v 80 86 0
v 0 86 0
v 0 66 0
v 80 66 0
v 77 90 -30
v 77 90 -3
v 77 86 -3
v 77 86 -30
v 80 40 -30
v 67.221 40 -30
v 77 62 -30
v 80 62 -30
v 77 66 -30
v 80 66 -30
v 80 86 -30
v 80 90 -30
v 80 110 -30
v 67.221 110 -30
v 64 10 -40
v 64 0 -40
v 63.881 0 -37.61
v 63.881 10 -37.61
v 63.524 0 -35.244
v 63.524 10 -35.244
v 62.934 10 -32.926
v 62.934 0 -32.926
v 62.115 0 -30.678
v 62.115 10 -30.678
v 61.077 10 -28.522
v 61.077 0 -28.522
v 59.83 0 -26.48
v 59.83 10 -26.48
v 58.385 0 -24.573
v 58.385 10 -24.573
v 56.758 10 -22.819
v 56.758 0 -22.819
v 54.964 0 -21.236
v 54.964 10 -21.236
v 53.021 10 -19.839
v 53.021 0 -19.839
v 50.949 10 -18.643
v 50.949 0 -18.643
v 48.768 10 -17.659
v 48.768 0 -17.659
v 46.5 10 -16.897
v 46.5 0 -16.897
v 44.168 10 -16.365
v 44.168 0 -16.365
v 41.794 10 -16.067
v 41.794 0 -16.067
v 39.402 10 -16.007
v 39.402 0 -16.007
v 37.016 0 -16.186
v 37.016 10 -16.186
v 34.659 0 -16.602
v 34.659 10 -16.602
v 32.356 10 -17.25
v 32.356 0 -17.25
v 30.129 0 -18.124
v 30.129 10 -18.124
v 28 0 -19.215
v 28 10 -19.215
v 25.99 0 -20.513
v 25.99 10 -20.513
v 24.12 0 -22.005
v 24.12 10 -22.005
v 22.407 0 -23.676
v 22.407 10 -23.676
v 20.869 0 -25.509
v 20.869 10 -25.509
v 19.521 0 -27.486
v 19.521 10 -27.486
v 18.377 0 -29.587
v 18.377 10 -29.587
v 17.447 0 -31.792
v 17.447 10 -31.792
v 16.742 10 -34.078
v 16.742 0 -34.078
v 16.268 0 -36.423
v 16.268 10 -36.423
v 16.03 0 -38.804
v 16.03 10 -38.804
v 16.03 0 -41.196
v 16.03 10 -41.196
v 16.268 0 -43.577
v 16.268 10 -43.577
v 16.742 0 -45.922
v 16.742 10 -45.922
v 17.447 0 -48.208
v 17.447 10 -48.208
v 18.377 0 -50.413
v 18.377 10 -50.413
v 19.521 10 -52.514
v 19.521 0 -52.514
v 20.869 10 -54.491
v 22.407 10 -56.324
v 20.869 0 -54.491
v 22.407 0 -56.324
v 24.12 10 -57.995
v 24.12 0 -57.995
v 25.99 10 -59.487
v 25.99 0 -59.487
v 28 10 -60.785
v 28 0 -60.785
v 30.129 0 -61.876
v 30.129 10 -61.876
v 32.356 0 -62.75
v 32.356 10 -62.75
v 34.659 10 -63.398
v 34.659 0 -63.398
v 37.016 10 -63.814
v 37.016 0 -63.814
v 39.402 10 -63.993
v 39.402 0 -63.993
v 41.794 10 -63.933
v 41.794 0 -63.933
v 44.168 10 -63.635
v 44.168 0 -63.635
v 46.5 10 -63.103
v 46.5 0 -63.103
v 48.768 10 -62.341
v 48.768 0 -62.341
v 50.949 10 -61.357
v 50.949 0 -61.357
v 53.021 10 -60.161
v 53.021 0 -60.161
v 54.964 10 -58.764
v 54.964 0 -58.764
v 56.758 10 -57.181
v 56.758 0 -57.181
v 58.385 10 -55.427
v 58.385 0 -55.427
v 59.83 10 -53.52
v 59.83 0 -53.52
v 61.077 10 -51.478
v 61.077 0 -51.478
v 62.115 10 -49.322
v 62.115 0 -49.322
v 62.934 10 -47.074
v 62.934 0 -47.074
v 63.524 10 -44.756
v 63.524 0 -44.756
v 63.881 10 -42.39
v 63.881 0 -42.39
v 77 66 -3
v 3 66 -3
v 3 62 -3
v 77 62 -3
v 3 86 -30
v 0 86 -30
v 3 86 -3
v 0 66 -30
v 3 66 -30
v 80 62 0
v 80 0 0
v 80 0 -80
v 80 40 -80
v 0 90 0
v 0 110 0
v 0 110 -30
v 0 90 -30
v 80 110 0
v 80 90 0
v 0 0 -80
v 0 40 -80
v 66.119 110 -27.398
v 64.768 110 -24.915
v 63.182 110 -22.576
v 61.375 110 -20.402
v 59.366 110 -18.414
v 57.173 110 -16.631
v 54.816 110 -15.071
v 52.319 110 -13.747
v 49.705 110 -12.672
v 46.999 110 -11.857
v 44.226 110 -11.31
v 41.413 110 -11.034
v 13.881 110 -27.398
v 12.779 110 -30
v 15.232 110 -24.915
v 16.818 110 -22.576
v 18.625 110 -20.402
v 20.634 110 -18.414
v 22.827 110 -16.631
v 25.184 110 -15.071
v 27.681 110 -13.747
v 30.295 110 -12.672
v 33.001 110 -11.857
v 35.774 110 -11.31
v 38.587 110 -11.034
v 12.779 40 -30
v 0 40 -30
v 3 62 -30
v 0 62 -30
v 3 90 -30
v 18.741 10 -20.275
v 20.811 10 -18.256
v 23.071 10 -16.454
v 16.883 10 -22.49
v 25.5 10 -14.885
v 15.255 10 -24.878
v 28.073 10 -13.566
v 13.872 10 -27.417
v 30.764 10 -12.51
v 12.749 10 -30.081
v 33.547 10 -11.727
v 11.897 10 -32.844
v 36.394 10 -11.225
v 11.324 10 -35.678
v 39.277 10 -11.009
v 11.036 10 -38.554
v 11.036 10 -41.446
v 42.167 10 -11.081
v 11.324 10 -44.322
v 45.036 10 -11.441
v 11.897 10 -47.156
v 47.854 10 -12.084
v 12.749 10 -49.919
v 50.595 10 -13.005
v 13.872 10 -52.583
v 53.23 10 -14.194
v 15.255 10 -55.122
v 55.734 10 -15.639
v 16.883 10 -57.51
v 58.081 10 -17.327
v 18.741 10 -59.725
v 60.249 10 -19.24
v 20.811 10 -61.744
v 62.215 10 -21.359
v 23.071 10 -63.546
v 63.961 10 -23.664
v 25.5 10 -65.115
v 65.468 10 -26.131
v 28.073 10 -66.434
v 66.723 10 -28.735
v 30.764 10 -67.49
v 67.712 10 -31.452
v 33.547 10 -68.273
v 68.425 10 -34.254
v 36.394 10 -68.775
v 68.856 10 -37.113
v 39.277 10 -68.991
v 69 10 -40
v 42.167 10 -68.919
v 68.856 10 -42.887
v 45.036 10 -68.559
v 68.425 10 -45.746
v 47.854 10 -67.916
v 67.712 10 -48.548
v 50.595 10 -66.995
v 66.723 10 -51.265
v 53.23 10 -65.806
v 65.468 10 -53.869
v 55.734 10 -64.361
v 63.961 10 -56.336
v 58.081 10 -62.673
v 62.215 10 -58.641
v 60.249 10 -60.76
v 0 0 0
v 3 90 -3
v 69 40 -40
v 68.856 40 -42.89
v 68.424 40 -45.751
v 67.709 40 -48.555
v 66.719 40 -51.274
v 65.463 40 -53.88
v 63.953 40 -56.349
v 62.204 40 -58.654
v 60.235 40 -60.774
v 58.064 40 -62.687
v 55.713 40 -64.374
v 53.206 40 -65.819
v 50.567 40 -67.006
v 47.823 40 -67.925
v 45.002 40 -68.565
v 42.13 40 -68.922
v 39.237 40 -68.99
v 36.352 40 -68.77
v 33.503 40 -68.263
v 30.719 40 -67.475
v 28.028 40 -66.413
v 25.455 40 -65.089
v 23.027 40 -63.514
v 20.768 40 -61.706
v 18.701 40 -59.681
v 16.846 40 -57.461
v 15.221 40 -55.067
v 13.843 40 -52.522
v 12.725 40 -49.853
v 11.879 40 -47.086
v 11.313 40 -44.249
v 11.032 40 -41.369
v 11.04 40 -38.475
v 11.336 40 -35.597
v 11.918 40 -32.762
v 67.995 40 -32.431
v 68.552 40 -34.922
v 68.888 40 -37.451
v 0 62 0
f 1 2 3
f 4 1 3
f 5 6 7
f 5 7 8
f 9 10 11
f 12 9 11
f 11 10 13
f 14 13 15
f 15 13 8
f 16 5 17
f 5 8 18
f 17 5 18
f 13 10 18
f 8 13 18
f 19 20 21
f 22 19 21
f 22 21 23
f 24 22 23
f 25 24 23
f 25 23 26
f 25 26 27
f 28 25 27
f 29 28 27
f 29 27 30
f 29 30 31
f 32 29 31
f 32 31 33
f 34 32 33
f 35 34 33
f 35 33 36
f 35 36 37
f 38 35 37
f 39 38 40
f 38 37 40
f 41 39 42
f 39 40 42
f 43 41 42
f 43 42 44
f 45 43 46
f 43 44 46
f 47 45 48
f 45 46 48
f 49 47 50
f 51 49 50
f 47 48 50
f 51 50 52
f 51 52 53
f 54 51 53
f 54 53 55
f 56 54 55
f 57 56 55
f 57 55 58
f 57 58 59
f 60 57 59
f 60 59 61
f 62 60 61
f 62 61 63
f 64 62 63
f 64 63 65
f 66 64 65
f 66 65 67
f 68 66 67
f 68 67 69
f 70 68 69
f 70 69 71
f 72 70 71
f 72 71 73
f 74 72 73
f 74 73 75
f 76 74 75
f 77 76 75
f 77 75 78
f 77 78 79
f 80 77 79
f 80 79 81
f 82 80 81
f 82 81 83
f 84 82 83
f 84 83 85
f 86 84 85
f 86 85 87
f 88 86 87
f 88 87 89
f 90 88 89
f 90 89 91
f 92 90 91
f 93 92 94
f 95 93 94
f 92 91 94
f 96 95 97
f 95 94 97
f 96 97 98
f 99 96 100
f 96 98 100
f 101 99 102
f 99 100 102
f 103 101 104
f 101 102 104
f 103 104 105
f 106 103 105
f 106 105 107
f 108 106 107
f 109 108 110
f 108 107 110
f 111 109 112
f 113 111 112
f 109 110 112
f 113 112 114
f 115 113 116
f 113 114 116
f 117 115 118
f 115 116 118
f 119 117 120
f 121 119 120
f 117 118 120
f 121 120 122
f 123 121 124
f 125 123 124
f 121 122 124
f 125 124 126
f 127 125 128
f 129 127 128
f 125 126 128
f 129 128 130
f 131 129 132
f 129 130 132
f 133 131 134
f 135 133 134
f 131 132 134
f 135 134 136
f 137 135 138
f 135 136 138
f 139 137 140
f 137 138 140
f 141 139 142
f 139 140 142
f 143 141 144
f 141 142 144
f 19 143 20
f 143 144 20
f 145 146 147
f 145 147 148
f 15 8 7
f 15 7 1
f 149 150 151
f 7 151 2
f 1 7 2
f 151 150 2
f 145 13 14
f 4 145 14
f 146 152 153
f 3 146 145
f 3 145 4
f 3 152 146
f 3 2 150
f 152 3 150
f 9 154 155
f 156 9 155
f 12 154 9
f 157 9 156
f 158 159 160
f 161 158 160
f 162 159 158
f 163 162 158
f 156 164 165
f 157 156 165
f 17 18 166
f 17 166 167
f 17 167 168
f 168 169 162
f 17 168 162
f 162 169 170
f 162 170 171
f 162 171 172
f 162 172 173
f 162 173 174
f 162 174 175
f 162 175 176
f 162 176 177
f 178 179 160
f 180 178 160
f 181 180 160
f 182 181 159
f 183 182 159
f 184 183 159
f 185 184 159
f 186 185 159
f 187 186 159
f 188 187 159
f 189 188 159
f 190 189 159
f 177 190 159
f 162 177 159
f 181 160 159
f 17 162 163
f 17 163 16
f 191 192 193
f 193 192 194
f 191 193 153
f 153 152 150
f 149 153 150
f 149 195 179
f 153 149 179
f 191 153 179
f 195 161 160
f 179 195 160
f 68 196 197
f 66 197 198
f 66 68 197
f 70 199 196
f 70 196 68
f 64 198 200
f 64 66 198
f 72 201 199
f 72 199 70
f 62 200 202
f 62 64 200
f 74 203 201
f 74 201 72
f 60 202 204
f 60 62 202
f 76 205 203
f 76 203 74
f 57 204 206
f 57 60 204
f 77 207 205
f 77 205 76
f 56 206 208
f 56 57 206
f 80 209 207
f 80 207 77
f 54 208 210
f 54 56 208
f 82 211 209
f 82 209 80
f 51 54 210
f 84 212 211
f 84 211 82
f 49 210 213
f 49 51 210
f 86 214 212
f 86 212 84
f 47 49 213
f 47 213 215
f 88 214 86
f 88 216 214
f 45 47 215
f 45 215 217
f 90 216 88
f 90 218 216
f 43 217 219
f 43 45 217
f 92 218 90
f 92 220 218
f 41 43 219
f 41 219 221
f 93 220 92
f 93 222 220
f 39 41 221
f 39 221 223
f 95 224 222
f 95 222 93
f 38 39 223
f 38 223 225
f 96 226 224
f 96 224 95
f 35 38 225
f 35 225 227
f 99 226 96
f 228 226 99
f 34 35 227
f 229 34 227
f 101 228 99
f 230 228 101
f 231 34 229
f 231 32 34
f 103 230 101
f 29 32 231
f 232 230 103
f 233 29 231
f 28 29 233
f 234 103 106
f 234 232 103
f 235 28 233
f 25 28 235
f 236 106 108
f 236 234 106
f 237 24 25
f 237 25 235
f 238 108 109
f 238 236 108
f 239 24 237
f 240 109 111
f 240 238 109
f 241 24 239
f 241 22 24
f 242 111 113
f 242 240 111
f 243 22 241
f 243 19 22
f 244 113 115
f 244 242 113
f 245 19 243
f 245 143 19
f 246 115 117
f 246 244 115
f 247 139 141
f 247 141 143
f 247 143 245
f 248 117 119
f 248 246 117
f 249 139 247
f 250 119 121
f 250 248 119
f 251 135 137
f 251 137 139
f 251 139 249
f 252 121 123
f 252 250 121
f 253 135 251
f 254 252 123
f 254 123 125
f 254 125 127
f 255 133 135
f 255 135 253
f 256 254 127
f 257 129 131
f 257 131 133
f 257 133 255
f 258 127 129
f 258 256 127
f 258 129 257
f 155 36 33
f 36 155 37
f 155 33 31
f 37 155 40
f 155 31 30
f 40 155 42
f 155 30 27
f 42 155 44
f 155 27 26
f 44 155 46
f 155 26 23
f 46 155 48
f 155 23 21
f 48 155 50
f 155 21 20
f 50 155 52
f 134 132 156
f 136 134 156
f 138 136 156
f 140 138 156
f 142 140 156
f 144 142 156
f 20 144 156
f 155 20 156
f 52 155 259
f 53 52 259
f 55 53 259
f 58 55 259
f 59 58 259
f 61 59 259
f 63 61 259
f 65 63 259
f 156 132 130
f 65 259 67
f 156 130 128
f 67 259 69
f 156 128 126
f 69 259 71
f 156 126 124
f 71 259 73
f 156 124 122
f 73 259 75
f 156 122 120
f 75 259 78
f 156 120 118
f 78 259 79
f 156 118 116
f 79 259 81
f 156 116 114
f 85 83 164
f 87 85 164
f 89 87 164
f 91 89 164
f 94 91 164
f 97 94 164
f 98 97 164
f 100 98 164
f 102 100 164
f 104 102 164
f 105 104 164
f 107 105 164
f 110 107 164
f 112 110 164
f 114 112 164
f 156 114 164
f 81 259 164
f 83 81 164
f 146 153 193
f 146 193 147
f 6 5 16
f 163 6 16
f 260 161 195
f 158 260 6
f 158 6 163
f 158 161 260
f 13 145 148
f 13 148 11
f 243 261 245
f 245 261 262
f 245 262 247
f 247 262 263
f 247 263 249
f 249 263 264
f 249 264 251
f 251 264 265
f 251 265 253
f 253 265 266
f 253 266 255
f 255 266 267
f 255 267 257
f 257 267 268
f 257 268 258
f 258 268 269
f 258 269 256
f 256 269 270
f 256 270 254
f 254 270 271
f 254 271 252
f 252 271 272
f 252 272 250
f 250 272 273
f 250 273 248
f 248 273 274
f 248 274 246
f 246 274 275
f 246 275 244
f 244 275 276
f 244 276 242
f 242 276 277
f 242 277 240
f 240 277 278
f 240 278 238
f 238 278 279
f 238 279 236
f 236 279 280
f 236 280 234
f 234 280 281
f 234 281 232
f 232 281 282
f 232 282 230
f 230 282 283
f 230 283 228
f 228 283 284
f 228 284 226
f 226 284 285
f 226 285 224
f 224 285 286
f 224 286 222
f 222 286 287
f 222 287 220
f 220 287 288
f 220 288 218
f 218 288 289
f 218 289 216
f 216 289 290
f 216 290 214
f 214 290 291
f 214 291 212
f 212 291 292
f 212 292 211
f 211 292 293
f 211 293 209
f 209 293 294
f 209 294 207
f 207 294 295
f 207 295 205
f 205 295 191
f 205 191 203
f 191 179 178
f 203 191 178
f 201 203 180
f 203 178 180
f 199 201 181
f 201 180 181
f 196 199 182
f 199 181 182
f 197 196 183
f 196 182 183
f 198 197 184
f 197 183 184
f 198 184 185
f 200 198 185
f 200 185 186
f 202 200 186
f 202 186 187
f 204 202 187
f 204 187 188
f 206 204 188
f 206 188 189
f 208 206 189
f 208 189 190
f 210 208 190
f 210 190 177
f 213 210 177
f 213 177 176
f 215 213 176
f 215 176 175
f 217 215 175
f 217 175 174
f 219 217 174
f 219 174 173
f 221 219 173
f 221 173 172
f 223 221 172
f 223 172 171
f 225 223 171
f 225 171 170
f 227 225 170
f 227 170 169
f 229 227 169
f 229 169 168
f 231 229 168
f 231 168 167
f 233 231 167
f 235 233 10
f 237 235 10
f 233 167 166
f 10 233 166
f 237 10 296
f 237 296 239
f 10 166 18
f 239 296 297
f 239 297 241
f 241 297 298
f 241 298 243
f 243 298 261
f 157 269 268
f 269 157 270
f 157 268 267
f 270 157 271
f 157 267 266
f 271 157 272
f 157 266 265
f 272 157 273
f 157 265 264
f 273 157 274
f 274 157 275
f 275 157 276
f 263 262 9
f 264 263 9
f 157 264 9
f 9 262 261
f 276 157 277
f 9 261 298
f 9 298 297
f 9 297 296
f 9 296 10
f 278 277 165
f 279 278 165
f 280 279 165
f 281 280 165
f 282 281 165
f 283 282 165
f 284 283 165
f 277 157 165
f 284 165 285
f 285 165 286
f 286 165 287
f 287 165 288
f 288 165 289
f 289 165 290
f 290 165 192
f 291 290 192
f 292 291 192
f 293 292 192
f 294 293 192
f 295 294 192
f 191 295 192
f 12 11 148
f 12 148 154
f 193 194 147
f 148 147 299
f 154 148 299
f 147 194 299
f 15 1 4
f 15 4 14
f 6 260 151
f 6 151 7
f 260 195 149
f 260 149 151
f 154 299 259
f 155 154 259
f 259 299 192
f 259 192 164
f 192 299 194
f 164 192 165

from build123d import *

# Parameters (mm, degrees)
BOSS_EXTRUDE2_DEPTH = 80
SKETCH5_R           = 29
CUT_EXTRUDE1_DEPTH  = 100
SKETCH6_R           = 24
CUT_EXTRUDE2_DEPTH  = 111
SKETCH7_W           = 30
SKETCH7_H           = 4
CUT_EXTRUDE3_DEPTH  = 3
SKETCH8_W           = 30
SKETCH8_H           = 4
CUT_EXTRUDE4_DEPTH  = 3
SKETCH9_W           = 74
SKETCH9_H           = 4
CUT_EXTRUDE5_DEPTH  = 3


with BuildPart() as part:
    # Sketch4 → Boss-Extrude2 (new body)
    with BuildSketch(Plane(origin=(0, 0, 0), x_dir=(0, 0, -1), z_dir=(1, 0, 0))):
        Polygon((0, 0), (80, 0), (80, 40), (30, 40), (30, 110), (0, 110), align=None)
    extrude(amount=BOSS_EXTRUDE2_DEPTH)

    # Sketch5 → Cut-Extrude1 (cut)
    with BuildSketch(Plane(origin=(0, 110, 0), x_dir=(1, 0, 0), z_dir=(0, 1, 0))):
        with Locations((40, 40)):
            Circle(SKETCH5_R)
    extrude(amount=-CUT_EXTRUDE1_DEPTH, mode=Mode.SUBTRACT)

    # Sketch6 → Cut-Extrude2 (cut, through all)
    with BuildSketch(Plane.XZ):
        with Locations((40, -40)):
            Circle(SKETCH6_R)
    extrude(amount=-CUT_EXTRUDE2_DEPTH, mode=Mode.SUBTRACT)

    # Sketch7 → Cut-Extrude3 (cut)
    with BuildSketch(Plane(origin=(80, 0, 0), x_dir=(0, 0, -1), z_dir=(1, 0, 0))):
        with Locations((15, 88)):
            Rectangle(SKETCH7_W, SKETCH7_H)
        with Locations((15, 64)):
            Rectangle(SKETCH7_W, SKETCH7_H)
    extrude(amount=-CUT_EXTRUDE3_DEPTH, mode=Mode.SUBTRACT)

    # Sketch8 → Cut-Extrude4 (cut)
    with BuildSketch(Plane.ZY):
        with Locations((-15, 88)):
            Rectangle(SKETCH8_W, SKETCH8_H)
        with Locations((-15, 64)):
            Rectangle(SKETCH8_W, SKETCH8_H)
    extrude(amount=-CUT_EXTRUDE4_DEPTH, mode=Mode.SUBTRACT)

    # Sketch9 → Cut-Extrude5 (cut)
    with BuildSketch(Plane.XY):
        with Locations((40, 88)):
            Rectangle(SKETCH9_W, SKETCH9_H)
        with Locations((40, 64)):
            Rectangle(SKETCH9_W, SKETCH9_H)
    extrude(amount=-CUT_EXTRUDE5_DEPTH, mode=Mode.SUBTRACT)


solid = part.part
